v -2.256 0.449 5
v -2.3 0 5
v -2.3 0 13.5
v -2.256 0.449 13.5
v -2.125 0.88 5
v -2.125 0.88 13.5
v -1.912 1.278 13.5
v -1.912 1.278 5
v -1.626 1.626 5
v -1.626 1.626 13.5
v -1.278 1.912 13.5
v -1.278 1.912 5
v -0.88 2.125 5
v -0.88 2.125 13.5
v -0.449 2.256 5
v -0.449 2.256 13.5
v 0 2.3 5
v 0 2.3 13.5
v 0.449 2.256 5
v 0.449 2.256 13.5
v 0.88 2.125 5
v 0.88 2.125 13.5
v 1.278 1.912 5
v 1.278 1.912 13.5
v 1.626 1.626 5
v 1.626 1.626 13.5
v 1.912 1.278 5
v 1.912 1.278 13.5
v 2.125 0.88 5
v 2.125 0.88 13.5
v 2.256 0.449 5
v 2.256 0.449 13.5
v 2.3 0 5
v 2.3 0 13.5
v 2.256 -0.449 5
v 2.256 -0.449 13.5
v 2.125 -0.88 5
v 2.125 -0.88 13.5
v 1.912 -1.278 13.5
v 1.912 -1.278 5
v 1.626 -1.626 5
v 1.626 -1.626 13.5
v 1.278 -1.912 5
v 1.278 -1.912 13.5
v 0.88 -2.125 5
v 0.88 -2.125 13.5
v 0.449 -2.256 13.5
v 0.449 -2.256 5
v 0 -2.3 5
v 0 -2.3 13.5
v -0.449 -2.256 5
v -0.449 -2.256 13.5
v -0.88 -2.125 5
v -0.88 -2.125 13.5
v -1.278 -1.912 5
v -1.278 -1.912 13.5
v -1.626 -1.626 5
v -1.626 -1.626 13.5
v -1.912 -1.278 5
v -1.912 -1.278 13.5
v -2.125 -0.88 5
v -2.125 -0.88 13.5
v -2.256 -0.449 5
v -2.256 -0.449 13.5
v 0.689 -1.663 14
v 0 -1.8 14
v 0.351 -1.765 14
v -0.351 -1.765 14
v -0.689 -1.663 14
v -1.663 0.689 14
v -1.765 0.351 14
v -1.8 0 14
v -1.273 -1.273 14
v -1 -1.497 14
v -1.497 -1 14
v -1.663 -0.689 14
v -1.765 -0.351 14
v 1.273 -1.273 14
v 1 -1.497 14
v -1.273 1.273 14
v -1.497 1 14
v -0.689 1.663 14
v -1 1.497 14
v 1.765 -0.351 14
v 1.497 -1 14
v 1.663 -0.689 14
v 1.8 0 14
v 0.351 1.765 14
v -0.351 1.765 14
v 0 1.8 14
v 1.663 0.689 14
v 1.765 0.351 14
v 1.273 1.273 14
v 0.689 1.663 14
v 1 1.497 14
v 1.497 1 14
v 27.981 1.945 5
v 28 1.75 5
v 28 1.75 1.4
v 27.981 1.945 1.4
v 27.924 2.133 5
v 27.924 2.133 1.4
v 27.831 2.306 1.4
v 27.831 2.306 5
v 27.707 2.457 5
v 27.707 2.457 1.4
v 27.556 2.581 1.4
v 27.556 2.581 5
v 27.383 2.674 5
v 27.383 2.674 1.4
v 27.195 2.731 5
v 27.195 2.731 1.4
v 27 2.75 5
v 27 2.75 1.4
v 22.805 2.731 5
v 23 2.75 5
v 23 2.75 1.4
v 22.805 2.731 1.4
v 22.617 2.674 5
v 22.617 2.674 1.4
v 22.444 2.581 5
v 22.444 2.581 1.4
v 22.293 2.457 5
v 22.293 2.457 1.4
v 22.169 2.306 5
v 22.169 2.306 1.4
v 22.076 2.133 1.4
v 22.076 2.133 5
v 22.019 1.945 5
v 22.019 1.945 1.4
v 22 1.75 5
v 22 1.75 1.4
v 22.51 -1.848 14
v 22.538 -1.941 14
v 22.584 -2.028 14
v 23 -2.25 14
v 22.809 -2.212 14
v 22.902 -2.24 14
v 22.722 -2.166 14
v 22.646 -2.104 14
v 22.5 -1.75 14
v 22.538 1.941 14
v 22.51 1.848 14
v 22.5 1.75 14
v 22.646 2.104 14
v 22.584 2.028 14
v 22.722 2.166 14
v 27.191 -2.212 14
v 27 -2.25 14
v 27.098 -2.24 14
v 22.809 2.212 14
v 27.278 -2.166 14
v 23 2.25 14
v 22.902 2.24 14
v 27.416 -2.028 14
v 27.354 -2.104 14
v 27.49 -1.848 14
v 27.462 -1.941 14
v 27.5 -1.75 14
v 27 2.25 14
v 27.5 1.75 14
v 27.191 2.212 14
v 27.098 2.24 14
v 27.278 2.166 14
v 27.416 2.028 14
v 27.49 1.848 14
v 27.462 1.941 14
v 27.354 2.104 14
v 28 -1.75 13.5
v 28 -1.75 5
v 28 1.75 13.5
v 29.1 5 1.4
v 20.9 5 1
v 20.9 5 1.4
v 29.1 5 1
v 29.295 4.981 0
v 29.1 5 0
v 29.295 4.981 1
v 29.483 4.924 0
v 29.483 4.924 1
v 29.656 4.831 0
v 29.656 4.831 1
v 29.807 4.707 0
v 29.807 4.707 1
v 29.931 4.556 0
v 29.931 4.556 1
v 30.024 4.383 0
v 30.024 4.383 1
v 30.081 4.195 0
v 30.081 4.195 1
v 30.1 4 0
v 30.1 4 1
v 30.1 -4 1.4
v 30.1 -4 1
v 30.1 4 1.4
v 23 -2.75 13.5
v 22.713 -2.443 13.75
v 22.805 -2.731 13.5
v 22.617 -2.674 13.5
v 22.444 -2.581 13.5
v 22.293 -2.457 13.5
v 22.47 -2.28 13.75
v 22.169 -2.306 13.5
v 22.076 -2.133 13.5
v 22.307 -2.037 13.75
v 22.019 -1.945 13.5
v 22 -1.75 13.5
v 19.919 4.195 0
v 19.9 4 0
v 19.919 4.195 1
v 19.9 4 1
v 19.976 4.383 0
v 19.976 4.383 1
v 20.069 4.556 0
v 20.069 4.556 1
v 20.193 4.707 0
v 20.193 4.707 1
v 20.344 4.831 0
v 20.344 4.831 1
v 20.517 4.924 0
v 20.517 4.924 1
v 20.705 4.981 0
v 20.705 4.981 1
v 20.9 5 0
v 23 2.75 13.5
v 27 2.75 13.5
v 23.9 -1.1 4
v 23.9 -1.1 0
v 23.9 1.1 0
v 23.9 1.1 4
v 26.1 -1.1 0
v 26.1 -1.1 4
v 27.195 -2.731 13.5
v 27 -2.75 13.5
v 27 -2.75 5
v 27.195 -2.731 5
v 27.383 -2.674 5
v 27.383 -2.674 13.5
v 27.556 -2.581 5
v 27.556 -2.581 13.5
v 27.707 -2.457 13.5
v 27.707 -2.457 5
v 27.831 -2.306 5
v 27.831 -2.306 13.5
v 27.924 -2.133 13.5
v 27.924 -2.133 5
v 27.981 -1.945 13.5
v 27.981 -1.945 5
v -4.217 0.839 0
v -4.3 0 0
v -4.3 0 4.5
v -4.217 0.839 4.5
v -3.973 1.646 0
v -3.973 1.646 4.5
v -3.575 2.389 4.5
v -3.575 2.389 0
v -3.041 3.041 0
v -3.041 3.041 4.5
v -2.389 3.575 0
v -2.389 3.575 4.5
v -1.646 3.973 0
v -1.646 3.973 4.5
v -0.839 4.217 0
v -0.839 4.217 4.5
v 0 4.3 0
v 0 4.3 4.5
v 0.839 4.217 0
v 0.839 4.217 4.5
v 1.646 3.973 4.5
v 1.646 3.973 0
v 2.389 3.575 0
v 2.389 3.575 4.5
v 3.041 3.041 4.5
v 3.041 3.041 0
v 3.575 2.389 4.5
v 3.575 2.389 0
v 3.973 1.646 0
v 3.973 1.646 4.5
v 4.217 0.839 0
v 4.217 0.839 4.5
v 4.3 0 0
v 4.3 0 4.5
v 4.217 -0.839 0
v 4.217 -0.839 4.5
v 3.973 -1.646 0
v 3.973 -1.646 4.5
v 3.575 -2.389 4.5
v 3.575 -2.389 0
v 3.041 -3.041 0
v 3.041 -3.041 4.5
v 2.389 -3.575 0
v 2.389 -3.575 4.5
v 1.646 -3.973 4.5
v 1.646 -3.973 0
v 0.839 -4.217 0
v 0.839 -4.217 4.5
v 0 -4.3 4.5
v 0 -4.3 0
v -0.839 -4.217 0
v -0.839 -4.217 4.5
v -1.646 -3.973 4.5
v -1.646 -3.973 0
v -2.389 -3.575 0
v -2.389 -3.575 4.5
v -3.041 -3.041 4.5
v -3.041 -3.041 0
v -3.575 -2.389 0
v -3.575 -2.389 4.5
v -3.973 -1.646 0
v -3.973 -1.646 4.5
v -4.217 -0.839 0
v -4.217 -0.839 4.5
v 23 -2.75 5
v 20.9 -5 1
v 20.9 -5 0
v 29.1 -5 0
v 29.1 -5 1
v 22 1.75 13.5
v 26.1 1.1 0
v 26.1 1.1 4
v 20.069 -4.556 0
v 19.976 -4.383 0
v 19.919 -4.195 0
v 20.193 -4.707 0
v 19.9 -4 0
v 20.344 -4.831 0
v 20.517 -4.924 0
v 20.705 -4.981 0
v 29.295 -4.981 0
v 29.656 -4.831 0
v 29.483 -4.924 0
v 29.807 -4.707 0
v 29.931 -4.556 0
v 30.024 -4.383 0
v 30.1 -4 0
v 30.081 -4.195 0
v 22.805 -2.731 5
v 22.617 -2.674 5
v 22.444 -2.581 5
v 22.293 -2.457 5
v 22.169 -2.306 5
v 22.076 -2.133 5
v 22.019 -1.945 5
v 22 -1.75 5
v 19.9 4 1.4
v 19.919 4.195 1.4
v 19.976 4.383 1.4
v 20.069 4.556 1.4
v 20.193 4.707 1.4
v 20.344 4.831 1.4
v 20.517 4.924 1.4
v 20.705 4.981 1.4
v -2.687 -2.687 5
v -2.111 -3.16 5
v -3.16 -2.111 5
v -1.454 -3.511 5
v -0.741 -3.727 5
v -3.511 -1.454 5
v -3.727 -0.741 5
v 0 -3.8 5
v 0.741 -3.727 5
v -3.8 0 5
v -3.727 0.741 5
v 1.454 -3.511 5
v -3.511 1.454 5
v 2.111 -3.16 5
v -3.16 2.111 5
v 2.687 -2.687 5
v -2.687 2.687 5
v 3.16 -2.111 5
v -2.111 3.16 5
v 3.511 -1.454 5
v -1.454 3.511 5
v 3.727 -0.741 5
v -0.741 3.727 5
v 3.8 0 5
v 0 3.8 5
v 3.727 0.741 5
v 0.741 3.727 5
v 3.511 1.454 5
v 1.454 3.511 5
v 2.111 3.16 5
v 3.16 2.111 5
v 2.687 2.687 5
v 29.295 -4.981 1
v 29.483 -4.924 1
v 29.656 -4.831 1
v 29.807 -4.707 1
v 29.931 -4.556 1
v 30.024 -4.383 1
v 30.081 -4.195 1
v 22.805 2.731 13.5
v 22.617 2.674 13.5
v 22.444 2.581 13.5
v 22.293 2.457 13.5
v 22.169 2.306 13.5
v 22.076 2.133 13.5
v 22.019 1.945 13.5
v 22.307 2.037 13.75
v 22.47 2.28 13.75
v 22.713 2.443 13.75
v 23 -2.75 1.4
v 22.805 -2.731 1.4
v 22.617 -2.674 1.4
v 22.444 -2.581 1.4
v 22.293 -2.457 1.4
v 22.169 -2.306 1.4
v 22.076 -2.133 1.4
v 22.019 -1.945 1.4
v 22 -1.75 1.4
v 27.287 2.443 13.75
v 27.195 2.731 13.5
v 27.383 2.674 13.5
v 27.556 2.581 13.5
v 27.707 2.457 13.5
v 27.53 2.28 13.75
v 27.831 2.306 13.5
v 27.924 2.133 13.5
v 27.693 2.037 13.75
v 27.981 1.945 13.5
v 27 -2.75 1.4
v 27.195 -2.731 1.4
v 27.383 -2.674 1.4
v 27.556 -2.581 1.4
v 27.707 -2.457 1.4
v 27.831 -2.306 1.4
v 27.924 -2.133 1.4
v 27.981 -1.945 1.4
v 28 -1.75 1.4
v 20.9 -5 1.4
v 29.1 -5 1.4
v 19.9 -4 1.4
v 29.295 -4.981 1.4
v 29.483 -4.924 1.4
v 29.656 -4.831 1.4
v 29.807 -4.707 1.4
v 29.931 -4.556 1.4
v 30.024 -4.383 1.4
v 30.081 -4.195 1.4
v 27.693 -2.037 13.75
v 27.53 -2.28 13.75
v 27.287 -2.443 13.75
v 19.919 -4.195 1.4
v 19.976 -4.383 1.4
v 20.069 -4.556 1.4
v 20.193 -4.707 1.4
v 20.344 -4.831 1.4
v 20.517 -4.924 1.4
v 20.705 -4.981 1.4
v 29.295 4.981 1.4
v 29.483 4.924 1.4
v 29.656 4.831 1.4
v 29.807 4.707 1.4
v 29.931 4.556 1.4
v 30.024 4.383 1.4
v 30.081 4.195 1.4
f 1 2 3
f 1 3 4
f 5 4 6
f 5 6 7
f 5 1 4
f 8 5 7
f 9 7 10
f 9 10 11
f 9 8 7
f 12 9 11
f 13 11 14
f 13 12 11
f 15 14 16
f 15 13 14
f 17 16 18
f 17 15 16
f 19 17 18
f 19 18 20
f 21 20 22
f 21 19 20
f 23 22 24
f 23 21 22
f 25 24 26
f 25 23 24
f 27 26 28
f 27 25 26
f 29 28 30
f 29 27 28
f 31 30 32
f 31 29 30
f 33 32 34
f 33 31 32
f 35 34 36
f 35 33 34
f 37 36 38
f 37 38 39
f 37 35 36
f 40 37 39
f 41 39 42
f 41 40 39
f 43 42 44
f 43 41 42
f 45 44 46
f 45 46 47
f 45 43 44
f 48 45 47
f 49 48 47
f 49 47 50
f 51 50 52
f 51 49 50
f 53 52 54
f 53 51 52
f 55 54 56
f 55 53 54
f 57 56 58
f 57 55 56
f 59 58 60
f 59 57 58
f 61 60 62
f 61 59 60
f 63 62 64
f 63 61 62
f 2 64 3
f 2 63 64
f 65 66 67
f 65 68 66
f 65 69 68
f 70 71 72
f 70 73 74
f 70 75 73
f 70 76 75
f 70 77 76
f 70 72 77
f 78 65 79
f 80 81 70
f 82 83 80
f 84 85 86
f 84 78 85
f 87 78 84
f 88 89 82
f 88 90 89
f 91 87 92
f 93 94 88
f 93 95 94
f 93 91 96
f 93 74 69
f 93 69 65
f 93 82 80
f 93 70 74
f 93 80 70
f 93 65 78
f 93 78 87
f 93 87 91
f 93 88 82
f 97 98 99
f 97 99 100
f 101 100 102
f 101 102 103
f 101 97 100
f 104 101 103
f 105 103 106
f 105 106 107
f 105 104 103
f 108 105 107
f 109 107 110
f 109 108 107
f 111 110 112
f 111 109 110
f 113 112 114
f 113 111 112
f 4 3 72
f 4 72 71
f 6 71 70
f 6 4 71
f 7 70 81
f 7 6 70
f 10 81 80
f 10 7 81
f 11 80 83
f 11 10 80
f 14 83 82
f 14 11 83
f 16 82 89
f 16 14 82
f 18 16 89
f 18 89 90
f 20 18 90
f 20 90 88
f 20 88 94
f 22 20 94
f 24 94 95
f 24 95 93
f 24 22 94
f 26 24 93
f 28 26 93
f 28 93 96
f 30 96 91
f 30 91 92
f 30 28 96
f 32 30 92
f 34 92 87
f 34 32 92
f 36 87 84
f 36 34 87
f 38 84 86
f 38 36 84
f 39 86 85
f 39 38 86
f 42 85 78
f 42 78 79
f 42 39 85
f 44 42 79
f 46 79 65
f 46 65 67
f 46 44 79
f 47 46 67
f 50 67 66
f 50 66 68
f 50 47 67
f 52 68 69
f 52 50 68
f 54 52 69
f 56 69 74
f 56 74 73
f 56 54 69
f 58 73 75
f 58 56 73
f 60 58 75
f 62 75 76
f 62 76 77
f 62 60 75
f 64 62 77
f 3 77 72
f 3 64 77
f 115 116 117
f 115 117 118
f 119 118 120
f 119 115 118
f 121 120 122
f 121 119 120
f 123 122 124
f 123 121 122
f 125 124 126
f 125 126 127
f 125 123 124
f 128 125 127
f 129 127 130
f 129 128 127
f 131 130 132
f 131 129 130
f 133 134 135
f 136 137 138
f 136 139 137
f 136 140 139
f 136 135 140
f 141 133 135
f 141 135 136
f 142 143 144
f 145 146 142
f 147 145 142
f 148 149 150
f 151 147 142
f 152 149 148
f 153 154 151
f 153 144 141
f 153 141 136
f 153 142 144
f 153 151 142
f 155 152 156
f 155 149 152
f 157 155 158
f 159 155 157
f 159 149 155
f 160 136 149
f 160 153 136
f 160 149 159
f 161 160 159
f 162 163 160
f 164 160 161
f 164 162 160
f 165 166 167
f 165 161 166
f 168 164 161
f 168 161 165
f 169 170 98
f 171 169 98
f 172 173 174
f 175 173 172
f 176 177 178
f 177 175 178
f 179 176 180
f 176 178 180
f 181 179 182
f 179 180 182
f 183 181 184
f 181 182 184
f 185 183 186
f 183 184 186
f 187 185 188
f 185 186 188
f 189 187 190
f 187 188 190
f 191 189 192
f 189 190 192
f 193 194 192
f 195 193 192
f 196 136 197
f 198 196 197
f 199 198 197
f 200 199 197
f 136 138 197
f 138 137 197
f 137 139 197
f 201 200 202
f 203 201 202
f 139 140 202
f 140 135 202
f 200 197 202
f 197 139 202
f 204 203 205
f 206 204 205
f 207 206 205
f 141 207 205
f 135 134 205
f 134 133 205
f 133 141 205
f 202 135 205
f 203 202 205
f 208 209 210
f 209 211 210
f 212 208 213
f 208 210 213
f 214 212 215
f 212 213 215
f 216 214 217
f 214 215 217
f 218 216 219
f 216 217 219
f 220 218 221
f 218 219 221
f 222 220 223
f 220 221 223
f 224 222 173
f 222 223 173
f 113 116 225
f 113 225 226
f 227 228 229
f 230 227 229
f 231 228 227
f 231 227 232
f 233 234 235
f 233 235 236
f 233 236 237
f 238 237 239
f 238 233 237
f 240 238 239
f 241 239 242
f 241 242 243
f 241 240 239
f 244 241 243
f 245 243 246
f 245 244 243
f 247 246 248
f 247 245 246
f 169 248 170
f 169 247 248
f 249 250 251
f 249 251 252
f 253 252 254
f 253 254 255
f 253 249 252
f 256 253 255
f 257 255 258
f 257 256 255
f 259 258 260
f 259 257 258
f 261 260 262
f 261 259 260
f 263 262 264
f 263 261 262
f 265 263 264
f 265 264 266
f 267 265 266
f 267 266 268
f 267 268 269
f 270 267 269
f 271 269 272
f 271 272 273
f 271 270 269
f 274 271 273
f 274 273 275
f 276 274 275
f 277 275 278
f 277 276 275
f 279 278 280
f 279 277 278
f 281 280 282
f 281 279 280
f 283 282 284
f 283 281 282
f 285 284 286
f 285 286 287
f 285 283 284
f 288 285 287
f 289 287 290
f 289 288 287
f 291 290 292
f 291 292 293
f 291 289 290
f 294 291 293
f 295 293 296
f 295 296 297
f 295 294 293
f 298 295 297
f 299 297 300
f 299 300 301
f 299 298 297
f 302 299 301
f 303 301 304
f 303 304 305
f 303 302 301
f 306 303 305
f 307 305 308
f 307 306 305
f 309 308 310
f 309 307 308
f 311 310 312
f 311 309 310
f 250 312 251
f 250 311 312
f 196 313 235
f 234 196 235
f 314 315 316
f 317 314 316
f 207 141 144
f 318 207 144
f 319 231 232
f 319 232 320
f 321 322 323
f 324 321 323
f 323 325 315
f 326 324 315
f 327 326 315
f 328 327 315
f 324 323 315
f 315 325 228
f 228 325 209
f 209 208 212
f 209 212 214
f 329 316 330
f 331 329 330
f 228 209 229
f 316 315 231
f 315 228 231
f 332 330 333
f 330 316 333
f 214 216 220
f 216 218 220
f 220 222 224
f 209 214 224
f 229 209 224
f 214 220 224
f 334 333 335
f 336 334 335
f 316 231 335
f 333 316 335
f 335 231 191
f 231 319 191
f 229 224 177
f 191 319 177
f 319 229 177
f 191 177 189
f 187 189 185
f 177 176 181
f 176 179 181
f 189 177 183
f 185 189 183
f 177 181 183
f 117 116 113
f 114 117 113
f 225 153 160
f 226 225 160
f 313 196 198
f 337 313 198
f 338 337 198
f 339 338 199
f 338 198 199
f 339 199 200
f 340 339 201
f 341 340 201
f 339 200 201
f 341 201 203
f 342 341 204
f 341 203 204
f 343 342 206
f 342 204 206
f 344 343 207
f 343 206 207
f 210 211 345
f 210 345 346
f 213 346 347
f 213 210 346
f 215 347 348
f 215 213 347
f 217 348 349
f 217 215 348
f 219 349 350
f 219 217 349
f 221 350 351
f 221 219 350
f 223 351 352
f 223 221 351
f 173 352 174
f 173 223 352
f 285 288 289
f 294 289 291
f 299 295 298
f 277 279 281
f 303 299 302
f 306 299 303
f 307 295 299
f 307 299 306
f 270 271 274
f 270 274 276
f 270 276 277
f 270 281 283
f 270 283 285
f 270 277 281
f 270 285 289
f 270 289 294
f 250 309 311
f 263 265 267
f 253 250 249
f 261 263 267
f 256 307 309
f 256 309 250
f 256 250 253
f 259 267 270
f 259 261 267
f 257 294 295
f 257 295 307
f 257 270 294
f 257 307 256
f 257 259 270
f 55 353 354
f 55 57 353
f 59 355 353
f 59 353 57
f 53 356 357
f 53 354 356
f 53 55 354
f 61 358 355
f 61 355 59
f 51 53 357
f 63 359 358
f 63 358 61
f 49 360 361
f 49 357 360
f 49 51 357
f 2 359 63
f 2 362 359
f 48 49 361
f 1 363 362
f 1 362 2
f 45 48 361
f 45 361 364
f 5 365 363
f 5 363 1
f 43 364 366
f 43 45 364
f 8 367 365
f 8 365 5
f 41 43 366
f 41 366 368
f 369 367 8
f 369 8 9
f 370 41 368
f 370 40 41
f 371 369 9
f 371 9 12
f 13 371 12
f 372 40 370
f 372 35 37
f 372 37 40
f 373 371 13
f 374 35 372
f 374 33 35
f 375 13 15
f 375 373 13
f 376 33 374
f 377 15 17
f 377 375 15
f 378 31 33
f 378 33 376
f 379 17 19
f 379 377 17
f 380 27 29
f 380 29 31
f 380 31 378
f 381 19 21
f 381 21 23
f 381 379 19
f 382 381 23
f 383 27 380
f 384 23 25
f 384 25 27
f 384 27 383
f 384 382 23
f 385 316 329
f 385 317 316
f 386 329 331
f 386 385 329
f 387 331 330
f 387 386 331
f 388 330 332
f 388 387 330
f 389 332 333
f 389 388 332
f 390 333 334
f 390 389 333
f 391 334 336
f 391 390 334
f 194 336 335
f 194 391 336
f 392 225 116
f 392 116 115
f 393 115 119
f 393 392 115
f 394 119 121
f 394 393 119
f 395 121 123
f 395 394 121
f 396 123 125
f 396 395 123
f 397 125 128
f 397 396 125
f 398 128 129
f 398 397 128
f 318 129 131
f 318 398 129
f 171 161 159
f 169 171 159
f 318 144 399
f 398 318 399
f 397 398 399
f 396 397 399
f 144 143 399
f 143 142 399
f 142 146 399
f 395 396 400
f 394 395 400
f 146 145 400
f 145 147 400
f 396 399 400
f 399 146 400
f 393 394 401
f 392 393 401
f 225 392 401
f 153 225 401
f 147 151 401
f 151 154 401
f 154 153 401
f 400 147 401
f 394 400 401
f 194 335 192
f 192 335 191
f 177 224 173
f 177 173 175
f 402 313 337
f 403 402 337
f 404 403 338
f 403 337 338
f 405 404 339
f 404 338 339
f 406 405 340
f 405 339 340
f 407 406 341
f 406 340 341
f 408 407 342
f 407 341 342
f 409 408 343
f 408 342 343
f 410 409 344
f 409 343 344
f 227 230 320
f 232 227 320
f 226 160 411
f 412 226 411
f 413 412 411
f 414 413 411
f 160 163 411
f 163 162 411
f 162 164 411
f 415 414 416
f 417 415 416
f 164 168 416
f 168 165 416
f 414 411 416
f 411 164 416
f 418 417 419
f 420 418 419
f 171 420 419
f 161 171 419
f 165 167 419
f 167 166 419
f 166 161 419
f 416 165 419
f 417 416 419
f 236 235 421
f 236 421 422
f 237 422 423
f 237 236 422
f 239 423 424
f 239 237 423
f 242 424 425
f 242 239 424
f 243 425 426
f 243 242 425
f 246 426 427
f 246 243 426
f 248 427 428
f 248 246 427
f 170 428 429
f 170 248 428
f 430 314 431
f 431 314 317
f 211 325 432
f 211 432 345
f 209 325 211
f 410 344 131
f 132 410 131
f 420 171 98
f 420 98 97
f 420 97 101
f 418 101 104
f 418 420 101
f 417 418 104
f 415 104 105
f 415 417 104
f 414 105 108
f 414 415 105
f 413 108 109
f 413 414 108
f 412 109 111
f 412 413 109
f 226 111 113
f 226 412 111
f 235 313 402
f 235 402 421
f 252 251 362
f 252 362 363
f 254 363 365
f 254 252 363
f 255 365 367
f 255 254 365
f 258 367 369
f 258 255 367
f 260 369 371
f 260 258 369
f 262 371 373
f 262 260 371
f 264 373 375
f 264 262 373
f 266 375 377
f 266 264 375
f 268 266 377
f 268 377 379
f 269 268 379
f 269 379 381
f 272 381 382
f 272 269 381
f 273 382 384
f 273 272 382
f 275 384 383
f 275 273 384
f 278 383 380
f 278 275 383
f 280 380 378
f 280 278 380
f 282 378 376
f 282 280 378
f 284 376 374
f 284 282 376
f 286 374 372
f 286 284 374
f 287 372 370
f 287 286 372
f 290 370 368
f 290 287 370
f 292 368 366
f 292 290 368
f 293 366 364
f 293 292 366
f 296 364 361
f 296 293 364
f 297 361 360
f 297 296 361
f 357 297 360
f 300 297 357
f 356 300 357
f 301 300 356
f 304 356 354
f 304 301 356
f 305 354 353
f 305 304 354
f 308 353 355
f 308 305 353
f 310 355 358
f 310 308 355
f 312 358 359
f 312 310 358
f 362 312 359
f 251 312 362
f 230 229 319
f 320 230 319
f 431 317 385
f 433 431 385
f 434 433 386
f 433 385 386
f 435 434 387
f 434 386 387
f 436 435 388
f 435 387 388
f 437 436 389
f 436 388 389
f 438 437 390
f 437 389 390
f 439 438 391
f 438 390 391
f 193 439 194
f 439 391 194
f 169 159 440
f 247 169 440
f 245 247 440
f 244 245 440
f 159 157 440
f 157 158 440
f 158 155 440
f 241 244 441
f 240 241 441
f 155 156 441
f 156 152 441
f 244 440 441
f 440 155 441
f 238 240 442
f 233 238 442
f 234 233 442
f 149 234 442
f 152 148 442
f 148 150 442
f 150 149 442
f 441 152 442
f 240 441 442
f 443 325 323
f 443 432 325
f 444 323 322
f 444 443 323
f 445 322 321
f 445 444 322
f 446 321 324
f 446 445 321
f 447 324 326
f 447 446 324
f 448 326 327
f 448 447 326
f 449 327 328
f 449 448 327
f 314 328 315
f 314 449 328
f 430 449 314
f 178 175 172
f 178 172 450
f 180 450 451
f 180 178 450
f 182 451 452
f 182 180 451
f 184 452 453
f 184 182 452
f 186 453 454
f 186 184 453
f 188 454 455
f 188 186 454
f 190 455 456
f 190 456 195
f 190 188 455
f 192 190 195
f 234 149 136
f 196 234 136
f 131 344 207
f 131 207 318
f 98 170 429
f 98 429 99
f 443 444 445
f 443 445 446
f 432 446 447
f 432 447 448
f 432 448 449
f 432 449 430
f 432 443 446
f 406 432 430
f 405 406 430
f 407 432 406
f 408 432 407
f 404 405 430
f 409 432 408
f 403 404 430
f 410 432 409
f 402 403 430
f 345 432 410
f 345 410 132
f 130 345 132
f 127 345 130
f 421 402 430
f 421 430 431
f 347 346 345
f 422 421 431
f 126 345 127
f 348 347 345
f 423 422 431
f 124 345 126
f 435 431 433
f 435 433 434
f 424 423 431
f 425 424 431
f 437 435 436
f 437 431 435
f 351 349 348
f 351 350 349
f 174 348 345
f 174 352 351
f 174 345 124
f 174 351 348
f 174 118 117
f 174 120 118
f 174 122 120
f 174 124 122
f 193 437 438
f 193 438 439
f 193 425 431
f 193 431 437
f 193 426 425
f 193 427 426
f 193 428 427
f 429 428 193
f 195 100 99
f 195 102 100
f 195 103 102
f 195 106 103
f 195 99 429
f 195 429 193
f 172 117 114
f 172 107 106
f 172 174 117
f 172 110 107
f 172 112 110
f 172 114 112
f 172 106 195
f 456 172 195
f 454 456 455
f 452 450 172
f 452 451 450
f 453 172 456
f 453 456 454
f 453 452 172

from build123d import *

# Parameters (mm, degrees)
F2_SIZE   = 0.5
F3_W      = 6
F3_H      = 5.5
F3_W_2    = 2.2
F3_H_2    = 2.2
F4_DEPTH  = 14
F3_W_3    = 10.2
F3_H_3    = 10
F5_DEPTH  = 1
F6_R      = 1
F7_SIZE   = 0.5
F8_DEPTH  = 4
F9_DEPTH  = 4
F10_DEPTH = 3.6


with BuildPart() as f1:
    # F0 (on Front) → F1 (revolve)
    with BuildSketch(Plane.XZ):
        Polygon((-4.3, 0), (0, 0), (0, 14), (-2.3, 14), (-2.3, 5), (-4.3, 5), align=None)
    revolve(axis=Axis((0, 0, 7), (0, 0, -1)))

    # F2
    f2_edges = [f1.edges().sort_by_distance(p)[0] for p in [
        (4.3, 0, 5),
        (2.3, 0, 14),
    ]]
    chamfer(f2_edges, length=F2_SIZE)


with BuildPart() as f4:
    # F3 (on Top) → F4 (new body, through all)
    with BuildSketch(Plane.XY):
        with Locations((25, 0)):
            Rectangle(F3_W, F3_H)
        with Locations((25, 0)):
            Rectangle(F3_W_2, F3_H_2, mode=Mode.SUBTRACT)
        with Locations((25, 0)):
            Rectangle(F3_W_2, F3_H_2)
    extrude(amount=F4_DEPTH)

    # F3 (on Top) → F5 (join)
    with BuildSketch(Plane.XY):
        with Locations((25, 0)):
            Rectangle(F3_W_3, F3_H_3)
        with Locations((25, 0)):
            Rectangle(F3_W, F3_H, mode=Mode.SUBTRACT)
    extrude(amount=F5_DEPTH)

    # F6
    f6_edges = [f4.edges().sort_by_distance(p)[0] for p in [
        (22, -2.75, 7.5),
        (28, -2.75, 7.5),
        (28, 2.75, 7.5),
        (22, 2.75, 7.5),
        (30.1, -5, 0.5),
        (19.9, -5, 0.5),
        (30.1, 5, 0.5),
        (19.9, 5, 0.5),
    ]]
    fillet(f6_edges, radius=F6_R)

    # F7
    f7_edges = [f4.edges().sort_by_distance(p)[0] for p in [
        (25, 2.75, 14),
        (27.707107, 2.457107, 14),
        (22.292893, 2.457107, 14),
        (28, 0, 14),
        (22, 0, 14),
        (27.707107, -2.457107, 14),
        (22.292893, -2.457107, 14),
        (25, -2.75, 14),
    ]]
    chamfer(f7_edges, length=F7_SIZE)

    # F3 (on Top) → F8 (cut)
    with BuildSketch(Plane.XY):
        with Locations((25, 0)):
            Rectangle(F3_W_2, F3_H_2)
    extrude(amount=F8_DEPTH, mode=Mode.SUBTRACT)

    # F9 (add, through all): a face of the model
    f9_faces = [f4.faces().sort_by_distance(p)[0] for p in [
        (25, 4.8571574293, 1),
    ]]
    extrude(f9_faces, amount=F9_DEPTH)

    # F10 (cut): a face of the model
    f10_faces = [f4.faces().sort_by_distance(p)[0] for p in [
        (25, 4.8571574293, 5),
    ]]
    extrude(f10_faces, amount=-F10_DEPTH, mode=Mode.SUBTRACT)


solid = Compound([f1.part, f4.part])
